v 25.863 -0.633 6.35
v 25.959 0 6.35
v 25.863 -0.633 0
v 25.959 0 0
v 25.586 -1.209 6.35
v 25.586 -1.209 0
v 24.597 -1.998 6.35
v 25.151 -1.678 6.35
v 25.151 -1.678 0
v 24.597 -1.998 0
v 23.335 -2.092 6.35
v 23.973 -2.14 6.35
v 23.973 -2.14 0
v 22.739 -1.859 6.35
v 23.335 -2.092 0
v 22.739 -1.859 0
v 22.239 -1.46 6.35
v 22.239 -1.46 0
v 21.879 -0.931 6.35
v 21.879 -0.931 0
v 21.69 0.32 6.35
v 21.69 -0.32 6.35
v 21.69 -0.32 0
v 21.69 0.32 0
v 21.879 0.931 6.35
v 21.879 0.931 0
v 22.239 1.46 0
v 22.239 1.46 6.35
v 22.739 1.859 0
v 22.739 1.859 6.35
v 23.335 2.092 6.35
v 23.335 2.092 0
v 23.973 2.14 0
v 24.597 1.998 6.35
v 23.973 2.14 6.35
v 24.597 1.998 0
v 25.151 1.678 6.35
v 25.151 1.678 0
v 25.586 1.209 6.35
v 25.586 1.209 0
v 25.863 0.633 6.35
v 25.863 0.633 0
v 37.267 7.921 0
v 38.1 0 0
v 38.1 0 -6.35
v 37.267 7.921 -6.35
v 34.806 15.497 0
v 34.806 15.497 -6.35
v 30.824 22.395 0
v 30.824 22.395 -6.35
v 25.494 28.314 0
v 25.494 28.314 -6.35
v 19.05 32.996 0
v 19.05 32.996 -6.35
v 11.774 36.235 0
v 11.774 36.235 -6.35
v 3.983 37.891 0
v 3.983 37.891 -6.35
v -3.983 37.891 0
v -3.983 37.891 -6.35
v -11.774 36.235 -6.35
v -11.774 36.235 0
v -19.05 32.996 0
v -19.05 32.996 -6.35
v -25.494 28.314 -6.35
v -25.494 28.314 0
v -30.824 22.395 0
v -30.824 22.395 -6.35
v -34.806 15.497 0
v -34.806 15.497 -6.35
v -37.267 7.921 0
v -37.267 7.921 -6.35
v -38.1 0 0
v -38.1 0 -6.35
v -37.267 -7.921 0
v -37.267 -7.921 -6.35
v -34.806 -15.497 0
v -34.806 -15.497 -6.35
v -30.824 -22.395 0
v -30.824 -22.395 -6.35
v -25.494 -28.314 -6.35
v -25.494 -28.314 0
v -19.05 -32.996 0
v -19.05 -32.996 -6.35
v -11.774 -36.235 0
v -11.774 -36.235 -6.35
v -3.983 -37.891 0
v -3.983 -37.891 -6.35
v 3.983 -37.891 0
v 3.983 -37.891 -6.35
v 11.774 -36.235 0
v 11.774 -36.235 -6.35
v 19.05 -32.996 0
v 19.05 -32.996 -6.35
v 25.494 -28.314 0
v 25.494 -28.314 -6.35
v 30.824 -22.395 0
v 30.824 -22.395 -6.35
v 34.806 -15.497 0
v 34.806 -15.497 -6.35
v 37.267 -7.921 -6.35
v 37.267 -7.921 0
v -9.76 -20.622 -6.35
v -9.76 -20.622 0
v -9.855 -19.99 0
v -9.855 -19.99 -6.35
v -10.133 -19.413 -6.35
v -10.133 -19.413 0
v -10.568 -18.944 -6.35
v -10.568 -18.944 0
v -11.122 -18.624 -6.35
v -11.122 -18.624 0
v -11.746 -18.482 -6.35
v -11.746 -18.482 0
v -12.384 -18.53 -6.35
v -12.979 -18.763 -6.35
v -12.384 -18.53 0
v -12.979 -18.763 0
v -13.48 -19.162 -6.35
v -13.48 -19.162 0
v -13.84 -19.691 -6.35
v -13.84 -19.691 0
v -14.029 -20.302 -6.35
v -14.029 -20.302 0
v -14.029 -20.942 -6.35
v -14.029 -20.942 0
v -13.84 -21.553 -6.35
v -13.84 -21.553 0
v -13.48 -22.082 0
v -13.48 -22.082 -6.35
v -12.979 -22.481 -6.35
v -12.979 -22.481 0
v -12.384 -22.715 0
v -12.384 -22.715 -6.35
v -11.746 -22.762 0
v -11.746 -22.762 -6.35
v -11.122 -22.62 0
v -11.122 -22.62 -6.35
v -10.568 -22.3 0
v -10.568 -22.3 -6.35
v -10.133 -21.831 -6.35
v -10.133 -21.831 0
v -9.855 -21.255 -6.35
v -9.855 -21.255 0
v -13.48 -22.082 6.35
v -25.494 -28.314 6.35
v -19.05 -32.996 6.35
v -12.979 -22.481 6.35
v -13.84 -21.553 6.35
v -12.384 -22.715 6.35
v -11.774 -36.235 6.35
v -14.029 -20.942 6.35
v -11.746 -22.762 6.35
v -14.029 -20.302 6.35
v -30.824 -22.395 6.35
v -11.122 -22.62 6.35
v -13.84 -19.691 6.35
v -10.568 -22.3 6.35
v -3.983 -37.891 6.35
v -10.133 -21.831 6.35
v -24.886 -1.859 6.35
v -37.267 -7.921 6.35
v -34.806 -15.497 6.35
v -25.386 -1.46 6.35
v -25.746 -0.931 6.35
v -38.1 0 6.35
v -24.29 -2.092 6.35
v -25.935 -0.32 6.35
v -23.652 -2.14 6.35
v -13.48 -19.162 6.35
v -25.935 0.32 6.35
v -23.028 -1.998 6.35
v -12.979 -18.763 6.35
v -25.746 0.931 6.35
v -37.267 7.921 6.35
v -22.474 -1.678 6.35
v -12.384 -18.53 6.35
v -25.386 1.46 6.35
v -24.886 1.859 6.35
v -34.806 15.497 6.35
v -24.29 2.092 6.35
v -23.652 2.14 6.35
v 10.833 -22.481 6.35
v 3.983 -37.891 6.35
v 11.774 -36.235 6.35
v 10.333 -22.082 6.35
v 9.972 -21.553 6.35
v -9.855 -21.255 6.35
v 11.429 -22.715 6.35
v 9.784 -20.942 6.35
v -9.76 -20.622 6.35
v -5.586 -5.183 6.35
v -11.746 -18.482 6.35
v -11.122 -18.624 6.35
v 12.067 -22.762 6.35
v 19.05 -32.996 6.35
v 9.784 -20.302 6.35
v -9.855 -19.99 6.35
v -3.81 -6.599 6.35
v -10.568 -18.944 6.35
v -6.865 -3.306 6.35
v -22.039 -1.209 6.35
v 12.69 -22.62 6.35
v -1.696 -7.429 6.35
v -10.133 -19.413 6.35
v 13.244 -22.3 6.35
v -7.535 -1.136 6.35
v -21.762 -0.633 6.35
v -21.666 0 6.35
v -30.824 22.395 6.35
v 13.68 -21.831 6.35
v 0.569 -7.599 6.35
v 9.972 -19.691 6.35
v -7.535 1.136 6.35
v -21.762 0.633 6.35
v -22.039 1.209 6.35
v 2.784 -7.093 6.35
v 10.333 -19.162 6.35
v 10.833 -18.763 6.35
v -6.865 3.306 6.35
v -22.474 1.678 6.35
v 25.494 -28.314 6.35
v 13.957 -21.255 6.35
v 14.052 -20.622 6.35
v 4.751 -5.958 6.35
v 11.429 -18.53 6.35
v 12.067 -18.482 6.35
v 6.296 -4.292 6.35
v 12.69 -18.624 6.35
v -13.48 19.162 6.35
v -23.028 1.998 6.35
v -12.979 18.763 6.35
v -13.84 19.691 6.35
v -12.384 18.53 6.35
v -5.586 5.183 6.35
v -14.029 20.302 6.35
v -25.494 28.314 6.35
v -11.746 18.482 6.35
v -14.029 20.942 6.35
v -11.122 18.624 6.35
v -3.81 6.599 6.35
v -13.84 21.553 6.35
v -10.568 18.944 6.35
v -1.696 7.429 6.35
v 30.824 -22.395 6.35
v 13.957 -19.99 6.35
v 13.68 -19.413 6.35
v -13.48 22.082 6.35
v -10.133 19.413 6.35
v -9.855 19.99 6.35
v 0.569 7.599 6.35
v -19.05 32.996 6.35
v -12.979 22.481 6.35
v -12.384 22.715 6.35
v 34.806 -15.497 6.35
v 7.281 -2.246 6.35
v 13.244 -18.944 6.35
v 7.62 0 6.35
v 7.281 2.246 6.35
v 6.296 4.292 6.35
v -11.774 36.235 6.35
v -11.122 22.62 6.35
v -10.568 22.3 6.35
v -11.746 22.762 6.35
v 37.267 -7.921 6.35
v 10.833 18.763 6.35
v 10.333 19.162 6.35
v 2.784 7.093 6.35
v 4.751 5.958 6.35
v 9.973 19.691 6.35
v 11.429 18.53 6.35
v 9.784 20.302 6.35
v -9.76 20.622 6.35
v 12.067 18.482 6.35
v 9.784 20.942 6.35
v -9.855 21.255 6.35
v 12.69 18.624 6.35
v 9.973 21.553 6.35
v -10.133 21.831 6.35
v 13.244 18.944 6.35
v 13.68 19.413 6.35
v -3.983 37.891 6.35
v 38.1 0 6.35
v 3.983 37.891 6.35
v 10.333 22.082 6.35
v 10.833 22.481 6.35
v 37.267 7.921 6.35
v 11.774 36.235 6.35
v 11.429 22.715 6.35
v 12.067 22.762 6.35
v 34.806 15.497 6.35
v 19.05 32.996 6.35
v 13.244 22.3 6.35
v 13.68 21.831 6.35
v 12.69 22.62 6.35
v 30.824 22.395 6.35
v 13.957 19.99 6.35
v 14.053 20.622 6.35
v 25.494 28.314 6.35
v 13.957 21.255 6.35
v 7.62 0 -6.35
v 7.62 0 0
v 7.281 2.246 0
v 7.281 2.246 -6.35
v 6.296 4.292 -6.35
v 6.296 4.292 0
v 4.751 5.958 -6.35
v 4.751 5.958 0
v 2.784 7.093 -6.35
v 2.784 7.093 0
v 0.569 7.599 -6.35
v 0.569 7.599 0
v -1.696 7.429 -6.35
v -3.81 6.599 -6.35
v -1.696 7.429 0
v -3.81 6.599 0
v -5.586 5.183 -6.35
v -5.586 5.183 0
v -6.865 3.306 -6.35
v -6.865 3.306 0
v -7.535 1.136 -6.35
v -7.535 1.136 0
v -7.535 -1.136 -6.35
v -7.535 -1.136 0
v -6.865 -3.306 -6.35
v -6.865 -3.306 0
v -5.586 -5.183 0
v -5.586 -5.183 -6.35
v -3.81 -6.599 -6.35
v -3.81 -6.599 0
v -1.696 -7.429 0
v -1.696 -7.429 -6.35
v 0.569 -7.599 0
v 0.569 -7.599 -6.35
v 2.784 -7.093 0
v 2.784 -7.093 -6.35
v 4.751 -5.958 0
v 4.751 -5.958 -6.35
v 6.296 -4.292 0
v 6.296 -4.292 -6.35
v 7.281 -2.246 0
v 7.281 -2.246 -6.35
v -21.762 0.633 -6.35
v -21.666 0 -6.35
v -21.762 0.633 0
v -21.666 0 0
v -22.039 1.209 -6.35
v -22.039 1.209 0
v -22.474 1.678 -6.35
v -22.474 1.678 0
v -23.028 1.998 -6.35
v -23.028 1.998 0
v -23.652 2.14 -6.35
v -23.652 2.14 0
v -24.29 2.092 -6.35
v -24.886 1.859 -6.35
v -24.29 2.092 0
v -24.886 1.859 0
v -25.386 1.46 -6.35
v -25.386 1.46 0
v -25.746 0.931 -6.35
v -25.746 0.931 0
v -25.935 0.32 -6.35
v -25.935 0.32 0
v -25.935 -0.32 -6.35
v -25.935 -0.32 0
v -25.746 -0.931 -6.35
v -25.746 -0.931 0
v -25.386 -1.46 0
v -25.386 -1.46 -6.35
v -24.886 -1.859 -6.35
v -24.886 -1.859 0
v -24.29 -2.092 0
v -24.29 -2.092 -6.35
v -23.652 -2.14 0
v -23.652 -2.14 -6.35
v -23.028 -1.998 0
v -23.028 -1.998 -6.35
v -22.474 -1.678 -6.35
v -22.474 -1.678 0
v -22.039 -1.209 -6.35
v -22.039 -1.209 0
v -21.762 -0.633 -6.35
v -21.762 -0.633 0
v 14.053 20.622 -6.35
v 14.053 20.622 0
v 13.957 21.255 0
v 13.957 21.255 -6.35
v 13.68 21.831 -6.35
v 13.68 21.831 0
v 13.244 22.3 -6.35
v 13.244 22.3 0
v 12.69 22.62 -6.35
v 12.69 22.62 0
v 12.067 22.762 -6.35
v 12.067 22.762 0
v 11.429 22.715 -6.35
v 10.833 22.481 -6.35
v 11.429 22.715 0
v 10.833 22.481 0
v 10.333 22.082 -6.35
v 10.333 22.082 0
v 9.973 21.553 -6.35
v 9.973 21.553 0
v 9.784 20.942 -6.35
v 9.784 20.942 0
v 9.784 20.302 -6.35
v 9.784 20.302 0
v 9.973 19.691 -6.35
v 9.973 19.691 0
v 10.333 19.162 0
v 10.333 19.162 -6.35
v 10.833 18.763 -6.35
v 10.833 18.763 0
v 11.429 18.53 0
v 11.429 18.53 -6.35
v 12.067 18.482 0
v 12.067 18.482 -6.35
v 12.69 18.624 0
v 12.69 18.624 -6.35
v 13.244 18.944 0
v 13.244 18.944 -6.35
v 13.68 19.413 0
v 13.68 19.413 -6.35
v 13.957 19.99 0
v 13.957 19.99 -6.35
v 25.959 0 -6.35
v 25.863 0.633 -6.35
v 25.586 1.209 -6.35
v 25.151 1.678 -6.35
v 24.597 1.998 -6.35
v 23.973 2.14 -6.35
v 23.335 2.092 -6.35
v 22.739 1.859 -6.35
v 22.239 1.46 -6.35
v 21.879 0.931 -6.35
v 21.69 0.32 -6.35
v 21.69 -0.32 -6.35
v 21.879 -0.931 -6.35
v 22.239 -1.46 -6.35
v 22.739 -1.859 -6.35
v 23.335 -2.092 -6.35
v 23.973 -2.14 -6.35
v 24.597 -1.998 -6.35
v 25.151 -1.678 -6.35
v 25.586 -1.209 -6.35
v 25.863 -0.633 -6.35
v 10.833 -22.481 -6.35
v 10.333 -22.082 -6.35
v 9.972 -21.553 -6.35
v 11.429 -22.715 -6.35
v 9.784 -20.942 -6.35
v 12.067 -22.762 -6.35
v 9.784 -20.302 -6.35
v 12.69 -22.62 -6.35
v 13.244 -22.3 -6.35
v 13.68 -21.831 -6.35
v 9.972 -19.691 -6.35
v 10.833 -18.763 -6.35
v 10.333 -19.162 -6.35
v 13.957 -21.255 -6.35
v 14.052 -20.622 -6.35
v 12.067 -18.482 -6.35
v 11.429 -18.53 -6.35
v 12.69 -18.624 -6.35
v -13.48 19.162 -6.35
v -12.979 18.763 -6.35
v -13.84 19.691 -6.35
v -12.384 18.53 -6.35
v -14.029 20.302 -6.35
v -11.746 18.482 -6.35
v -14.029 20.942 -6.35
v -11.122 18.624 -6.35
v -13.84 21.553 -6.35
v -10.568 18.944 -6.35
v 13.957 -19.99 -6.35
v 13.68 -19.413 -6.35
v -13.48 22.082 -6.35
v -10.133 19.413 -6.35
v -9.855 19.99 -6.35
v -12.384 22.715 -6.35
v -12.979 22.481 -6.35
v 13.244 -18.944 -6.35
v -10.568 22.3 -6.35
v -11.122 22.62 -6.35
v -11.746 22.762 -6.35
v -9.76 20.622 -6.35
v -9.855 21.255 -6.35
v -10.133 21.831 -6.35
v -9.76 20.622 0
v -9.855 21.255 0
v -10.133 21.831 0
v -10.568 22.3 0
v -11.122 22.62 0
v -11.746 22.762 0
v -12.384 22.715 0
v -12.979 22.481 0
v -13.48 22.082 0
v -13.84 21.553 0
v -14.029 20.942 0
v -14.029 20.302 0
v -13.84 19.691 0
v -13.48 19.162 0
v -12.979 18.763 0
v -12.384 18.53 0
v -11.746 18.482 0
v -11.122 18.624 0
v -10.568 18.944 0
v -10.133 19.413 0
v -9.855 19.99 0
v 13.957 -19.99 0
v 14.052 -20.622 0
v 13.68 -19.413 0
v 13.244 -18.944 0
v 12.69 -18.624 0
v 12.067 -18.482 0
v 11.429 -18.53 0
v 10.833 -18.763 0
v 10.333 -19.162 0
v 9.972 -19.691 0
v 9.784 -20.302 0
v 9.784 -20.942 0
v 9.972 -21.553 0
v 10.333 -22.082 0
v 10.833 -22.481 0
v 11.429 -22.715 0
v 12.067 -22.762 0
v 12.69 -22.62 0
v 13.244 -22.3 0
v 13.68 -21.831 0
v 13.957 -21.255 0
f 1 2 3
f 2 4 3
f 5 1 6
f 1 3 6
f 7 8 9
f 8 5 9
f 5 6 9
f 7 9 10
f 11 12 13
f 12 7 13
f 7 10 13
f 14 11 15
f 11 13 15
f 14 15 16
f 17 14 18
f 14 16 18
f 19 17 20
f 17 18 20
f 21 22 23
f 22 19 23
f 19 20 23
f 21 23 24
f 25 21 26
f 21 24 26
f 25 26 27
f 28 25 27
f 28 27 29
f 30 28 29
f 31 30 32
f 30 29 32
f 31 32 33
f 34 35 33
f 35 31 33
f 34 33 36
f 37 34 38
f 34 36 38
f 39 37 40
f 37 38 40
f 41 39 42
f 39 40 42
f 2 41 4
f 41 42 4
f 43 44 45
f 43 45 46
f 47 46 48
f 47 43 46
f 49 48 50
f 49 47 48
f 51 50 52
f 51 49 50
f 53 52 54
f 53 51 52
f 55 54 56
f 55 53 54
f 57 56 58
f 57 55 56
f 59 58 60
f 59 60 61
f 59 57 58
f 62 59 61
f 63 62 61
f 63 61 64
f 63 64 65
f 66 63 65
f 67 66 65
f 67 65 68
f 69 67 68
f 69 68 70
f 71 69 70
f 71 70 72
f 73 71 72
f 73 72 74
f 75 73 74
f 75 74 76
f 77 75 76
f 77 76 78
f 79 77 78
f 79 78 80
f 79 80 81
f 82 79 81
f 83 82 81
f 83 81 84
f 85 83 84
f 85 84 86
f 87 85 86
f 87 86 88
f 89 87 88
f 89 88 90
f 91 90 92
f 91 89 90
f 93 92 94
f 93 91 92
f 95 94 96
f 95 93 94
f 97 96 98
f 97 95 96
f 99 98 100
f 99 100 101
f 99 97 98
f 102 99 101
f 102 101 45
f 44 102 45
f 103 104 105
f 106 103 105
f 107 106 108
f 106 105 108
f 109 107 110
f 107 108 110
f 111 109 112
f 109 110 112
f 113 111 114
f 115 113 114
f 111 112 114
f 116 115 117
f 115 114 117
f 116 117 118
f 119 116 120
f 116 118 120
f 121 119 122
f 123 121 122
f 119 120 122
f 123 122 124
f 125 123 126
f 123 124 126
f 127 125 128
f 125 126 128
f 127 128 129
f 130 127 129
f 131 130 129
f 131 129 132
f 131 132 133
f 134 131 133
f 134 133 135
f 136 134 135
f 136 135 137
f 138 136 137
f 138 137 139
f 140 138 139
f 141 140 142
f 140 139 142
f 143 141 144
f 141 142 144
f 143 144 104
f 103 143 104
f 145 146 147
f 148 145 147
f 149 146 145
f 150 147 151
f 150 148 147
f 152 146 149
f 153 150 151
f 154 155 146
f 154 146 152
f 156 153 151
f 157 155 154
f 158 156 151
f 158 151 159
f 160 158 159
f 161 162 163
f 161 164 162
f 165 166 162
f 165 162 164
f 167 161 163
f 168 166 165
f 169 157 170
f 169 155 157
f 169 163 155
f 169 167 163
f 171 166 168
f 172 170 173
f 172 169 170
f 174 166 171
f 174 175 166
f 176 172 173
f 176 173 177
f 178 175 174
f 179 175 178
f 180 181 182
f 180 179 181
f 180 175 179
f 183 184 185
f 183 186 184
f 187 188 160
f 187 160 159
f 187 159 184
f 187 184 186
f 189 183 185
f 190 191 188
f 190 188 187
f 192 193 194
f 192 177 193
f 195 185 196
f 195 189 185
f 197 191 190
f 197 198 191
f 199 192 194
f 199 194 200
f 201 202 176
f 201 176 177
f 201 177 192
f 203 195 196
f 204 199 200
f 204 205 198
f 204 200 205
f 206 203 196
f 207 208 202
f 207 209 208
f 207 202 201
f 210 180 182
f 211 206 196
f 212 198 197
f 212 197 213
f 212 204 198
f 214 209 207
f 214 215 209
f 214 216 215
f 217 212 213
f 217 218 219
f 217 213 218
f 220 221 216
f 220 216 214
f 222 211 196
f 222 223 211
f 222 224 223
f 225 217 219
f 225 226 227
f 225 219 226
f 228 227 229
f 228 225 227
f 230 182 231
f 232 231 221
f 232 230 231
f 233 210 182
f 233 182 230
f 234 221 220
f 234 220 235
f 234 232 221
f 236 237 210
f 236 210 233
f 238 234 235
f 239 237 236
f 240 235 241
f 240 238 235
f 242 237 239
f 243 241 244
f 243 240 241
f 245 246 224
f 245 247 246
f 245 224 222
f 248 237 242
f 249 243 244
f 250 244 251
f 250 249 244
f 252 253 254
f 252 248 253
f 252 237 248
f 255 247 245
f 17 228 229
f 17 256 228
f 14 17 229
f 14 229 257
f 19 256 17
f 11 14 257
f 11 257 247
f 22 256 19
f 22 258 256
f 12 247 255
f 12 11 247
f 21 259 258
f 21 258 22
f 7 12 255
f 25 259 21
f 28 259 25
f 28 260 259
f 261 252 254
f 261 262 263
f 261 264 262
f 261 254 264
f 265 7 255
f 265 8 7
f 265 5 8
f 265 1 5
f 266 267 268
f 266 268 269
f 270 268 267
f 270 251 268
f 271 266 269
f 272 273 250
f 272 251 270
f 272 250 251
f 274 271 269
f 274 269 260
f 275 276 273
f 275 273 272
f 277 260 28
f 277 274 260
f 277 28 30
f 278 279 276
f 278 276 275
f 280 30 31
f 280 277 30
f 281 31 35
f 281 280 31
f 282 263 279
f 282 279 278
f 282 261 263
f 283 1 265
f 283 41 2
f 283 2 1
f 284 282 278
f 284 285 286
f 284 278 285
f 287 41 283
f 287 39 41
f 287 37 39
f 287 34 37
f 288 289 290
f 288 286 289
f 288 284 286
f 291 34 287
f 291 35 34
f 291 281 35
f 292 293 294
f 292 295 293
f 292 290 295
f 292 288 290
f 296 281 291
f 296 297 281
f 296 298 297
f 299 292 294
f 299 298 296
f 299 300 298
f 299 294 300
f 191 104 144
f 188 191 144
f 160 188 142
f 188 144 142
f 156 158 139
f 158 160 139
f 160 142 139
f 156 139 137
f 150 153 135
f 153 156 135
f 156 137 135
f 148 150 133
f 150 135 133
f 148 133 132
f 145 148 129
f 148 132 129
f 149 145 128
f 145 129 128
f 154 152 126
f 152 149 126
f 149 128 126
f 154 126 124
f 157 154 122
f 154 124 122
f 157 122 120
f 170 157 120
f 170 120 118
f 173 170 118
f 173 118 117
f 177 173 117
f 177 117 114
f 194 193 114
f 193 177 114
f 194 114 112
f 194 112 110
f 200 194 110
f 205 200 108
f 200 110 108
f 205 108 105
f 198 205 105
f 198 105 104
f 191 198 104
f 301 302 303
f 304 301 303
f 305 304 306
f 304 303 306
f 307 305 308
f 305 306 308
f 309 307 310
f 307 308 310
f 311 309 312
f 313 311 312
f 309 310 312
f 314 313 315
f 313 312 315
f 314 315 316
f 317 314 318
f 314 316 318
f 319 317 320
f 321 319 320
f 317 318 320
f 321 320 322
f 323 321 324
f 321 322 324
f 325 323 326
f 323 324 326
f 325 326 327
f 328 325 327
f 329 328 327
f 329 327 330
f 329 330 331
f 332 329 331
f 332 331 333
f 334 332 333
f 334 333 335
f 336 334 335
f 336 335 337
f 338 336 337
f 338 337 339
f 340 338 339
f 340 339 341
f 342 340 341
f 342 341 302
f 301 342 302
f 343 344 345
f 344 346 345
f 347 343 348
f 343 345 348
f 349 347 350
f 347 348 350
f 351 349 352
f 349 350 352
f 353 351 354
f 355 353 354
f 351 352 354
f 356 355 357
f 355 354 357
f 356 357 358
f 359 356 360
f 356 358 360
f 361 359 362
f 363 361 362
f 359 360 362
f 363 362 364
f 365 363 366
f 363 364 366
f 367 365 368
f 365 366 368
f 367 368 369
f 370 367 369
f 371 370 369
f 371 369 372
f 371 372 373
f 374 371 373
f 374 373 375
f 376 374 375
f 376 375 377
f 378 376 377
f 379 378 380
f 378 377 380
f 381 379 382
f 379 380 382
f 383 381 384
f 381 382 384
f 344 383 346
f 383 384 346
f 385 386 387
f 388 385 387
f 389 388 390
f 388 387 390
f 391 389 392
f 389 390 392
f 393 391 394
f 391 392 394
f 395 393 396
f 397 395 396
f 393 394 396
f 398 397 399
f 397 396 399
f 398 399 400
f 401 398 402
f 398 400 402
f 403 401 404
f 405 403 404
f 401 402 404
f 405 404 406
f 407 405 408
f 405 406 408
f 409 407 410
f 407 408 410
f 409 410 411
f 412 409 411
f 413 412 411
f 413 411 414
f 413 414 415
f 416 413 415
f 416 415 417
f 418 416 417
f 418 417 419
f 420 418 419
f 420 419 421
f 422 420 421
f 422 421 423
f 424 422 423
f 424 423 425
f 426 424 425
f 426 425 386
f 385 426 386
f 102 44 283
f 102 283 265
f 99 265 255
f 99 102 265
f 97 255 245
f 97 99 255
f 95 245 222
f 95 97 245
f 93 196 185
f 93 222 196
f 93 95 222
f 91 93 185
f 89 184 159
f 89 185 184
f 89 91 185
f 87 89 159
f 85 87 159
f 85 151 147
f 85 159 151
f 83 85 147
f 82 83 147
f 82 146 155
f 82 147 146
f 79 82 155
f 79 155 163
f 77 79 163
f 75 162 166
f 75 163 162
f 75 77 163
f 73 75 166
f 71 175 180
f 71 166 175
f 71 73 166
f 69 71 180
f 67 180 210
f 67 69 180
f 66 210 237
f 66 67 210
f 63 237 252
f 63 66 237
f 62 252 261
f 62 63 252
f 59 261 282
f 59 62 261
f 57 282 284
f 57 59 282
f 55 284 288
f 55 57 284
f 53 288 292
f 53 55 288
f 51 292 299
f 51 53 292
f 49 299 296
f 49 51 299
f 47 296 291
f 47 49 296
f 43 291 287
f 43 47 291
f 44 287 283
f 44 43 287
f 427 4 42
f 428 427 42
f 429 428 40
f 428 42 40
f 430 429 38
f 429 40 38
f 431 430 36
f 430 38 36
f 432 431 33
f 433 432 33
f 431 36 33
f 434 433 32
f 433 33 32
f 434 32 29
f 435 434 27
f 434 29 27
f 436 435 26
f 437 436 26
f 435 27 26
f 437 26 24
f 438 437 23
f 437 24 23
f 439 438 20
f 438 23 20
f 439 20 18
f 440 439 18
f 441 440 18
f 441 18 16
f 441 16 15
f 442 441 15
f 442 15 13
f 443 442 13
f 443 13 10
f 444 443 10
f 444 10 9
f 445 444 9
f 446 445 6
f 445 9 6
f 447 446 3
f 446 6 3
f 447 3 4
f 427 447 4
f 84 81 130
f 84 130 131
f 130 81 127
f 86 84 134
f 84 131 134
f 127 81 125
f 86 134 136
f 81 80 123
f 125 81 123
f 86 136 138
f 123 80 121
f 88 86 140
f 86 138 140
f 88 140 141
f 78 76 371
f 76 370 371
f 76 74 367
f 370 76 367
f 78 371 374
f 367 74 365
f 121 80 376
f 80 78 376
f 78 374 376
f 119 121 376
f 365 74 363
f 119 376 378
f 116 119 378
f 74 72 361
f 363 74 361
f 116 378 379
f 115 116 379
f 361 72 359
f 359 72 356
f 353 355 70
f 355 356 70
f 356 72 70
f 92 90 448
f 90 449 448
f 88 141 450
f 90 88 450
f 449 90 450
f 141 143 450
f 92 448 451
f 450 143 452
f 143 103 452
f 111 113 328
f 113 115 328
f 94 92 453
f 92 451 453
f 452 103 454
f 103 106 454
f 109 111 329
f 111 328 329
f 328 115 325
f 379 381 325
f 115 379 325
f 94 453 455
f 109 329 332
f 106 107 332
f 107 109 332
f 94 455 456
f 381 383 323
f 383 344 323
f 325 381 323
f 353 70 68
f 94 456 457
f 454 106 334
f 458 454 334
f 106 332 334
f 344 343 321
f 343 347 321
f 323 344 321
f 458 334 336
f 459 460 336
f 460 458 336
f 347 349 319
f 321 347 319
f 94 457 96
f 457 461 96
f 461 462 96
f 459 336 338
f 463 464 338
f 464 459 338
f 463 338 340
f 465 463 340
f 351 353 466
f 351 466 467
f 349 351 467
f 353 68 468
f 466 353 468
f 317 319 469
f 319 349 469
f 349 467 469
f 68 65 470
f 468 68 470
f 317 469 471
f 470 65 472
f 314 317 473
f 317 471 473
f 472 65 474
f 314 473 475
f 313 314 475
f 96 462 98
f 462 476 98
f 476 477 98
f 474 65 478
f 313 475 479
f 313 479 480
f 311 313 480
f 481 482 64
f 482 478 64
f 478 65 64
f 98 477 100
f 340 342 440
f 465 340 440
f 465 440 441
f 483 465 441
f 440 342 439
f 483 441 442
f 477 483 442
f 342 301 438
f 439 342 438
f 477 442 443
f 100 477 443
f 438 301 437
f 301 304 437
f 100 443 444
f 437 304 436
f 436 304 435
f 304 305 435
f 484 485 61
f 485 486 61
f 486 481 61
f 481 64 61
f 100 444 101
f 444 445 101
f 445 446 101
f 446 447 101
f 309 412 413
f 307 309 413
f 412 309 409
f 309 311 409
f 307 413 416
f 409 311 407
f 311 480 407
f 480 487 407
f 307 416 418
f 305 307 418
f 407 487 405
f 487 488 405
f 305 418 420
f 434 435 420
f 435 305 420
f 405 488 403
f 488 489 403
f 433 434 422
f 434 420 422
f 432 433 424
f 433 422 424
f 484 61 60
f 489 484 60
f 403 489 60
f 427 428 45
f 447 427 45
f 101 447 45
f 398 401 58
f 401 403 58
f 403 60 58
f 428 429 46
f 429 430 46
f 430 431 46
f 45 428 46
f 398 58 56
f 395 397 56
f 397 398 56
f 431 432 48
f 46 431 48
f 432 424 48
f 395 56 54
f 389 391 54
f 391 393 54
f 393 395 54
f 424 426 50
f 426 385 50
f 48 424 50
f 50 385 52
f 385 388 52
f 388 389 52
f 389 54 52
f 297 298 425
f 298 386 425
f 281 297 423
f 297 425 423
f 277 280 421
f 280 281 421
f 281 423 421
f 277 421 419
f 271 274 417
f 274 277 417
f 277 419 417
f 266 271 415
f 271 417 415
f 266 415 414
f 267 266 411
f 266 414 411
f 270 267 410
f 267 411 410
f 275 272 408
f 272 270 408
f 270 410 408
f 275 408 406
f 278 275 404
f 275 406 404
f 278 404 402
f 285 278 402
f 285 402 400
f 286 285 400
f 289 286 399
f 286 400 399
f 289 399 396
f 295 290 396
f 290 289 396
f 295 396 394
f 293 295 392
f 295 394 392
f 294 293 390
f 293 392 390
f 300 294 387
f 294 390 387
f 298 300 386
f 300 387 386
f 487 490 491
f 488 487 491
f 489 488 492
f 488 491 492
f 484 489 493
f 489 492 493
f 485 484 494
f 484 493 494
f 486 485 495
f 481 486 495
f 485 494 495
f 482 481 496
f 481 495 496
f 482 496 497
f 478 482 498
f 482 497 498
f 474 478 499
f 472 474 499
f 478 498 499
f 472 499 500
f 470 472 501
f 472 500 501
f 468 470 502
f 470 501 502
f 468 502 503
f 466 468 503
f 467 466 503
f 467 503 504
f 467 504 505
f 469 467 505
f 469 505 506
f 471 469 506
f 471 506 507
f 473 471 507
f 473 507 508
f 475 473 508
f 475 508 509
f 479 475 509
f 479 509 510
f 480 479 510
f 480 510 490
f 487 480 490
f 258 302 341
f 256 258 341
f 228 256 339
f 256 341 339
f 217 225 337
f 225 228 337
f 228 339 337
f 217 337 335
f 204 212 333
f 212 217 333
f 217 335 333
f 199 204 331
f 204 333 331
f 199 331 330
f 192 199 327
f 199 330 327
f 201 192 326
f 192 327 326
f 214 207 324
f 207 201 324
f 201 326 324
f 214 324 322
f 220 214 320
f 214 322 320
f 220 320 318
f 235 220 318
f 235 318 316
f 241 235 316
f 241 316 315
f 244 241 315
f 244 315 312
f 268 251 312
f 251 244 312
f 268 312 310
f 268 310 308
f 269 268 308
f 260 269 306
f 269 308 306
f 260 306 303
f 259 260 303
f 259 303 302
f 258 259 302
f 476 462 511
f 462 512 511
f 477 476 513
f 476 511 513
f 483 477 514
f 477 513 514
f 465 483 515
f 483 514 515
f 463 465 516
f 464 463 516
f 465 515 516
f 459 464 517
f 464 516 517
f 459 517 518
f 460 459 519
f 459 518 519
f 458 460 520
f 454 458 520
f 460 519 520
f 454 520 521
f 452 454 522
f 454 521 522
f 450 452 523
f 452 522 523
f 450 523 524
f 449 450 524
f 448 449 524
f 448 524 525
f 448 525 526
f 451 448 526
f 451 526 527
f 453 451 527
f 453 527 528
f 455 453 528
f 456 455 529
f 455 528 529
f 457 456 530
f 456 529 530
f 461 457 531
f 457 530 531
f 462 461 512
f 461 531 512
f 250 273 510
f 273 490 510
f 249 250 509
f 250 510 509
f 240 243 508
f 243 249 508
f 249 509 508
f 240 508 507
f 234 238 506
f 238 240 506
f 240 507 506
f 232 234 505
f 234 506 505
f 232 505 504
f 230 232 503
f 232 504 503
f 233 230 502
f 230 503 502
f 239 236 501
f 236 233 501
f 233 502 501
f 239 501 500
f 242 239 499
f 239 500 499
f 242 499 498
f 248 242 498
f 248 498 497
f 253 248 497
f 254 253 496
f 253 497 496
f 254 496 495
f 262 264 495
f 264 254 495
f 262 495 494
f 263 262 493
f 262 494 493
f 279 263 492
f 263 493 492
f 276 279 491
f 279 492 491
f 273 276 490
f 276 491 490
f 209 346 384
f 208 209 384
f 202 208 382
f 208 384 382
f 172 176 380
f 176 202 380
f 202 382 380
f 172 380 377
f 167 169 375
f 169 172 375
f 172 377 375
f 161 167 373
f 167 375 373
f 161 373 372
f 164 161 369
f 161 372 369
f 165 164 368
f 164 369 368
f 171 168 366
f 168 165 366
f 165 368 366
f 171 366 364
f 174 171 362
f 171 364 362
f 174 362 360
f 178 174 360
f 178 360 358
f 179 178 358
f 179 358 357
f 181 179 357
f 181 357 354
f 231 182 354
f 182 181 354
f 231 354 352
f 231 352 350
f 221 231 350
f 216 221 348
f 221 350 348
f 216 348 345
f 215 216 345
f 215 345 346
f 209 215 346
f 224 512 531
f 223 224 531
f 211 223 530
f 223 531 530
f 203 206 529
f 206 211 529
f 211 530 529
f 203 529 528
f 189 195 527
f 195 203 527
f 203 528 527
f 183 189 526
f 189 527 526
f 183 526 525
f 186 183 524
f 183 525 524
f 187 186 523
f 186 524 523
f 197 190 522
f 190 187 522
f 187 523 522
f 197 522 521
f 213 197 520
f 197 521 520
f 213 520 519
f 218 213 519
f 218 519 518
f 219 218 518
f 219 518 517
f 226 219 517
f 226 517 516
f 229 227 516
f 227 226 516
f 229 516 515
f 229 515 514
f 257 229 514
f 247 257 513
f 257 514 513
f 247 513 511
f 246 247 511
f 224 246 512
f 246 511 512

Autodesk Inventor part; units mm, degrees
ref_plane "YZ Plane" through (0, 0, 0) normal (1, 0, 0) x (0, 1, 0)
ref_plane "XZ Plane" through (0, 0, 0) normal (0, 1, 0) x (-1, 0, 0)
ref_plane "XY Plane" through (0, 0, 0) normal (0, 0, 1) x (1, 0, 0)
sketch "Sketch1" plane through (0, 0, 0) normal (0, 0, 1) x (1, 0, 0)
  circle A0 centre (23.8125, 0) radius 2.1463
  circle A1 centre (11.9063, 20.6222) radius 2.1463
  circle A2 centre (-11.9062, 20.6222) radius 2.1463
  circle A3 centre (-23.8125, 0) radius 2.1463
  circle A4 centre (-11.9063, -20.6222) radius 2.1463
  circle A5 centre (11.9062, -20.6222) radius 2.1463
  circle A6 centre (0, 0) radius 38.1
  circle A7 centre (0, 0) radius 7.62
  dimension "d0" = 4.2926
  dimension "d4" = 360
  dimension "d6" = 76.2
  dimension "d9" = 15.24
extrude "Extrusion1" add sketch "Sketch1" along normal mid plane 12.7
properties part number "Spool Hub" material "Acetal Resin, White"
